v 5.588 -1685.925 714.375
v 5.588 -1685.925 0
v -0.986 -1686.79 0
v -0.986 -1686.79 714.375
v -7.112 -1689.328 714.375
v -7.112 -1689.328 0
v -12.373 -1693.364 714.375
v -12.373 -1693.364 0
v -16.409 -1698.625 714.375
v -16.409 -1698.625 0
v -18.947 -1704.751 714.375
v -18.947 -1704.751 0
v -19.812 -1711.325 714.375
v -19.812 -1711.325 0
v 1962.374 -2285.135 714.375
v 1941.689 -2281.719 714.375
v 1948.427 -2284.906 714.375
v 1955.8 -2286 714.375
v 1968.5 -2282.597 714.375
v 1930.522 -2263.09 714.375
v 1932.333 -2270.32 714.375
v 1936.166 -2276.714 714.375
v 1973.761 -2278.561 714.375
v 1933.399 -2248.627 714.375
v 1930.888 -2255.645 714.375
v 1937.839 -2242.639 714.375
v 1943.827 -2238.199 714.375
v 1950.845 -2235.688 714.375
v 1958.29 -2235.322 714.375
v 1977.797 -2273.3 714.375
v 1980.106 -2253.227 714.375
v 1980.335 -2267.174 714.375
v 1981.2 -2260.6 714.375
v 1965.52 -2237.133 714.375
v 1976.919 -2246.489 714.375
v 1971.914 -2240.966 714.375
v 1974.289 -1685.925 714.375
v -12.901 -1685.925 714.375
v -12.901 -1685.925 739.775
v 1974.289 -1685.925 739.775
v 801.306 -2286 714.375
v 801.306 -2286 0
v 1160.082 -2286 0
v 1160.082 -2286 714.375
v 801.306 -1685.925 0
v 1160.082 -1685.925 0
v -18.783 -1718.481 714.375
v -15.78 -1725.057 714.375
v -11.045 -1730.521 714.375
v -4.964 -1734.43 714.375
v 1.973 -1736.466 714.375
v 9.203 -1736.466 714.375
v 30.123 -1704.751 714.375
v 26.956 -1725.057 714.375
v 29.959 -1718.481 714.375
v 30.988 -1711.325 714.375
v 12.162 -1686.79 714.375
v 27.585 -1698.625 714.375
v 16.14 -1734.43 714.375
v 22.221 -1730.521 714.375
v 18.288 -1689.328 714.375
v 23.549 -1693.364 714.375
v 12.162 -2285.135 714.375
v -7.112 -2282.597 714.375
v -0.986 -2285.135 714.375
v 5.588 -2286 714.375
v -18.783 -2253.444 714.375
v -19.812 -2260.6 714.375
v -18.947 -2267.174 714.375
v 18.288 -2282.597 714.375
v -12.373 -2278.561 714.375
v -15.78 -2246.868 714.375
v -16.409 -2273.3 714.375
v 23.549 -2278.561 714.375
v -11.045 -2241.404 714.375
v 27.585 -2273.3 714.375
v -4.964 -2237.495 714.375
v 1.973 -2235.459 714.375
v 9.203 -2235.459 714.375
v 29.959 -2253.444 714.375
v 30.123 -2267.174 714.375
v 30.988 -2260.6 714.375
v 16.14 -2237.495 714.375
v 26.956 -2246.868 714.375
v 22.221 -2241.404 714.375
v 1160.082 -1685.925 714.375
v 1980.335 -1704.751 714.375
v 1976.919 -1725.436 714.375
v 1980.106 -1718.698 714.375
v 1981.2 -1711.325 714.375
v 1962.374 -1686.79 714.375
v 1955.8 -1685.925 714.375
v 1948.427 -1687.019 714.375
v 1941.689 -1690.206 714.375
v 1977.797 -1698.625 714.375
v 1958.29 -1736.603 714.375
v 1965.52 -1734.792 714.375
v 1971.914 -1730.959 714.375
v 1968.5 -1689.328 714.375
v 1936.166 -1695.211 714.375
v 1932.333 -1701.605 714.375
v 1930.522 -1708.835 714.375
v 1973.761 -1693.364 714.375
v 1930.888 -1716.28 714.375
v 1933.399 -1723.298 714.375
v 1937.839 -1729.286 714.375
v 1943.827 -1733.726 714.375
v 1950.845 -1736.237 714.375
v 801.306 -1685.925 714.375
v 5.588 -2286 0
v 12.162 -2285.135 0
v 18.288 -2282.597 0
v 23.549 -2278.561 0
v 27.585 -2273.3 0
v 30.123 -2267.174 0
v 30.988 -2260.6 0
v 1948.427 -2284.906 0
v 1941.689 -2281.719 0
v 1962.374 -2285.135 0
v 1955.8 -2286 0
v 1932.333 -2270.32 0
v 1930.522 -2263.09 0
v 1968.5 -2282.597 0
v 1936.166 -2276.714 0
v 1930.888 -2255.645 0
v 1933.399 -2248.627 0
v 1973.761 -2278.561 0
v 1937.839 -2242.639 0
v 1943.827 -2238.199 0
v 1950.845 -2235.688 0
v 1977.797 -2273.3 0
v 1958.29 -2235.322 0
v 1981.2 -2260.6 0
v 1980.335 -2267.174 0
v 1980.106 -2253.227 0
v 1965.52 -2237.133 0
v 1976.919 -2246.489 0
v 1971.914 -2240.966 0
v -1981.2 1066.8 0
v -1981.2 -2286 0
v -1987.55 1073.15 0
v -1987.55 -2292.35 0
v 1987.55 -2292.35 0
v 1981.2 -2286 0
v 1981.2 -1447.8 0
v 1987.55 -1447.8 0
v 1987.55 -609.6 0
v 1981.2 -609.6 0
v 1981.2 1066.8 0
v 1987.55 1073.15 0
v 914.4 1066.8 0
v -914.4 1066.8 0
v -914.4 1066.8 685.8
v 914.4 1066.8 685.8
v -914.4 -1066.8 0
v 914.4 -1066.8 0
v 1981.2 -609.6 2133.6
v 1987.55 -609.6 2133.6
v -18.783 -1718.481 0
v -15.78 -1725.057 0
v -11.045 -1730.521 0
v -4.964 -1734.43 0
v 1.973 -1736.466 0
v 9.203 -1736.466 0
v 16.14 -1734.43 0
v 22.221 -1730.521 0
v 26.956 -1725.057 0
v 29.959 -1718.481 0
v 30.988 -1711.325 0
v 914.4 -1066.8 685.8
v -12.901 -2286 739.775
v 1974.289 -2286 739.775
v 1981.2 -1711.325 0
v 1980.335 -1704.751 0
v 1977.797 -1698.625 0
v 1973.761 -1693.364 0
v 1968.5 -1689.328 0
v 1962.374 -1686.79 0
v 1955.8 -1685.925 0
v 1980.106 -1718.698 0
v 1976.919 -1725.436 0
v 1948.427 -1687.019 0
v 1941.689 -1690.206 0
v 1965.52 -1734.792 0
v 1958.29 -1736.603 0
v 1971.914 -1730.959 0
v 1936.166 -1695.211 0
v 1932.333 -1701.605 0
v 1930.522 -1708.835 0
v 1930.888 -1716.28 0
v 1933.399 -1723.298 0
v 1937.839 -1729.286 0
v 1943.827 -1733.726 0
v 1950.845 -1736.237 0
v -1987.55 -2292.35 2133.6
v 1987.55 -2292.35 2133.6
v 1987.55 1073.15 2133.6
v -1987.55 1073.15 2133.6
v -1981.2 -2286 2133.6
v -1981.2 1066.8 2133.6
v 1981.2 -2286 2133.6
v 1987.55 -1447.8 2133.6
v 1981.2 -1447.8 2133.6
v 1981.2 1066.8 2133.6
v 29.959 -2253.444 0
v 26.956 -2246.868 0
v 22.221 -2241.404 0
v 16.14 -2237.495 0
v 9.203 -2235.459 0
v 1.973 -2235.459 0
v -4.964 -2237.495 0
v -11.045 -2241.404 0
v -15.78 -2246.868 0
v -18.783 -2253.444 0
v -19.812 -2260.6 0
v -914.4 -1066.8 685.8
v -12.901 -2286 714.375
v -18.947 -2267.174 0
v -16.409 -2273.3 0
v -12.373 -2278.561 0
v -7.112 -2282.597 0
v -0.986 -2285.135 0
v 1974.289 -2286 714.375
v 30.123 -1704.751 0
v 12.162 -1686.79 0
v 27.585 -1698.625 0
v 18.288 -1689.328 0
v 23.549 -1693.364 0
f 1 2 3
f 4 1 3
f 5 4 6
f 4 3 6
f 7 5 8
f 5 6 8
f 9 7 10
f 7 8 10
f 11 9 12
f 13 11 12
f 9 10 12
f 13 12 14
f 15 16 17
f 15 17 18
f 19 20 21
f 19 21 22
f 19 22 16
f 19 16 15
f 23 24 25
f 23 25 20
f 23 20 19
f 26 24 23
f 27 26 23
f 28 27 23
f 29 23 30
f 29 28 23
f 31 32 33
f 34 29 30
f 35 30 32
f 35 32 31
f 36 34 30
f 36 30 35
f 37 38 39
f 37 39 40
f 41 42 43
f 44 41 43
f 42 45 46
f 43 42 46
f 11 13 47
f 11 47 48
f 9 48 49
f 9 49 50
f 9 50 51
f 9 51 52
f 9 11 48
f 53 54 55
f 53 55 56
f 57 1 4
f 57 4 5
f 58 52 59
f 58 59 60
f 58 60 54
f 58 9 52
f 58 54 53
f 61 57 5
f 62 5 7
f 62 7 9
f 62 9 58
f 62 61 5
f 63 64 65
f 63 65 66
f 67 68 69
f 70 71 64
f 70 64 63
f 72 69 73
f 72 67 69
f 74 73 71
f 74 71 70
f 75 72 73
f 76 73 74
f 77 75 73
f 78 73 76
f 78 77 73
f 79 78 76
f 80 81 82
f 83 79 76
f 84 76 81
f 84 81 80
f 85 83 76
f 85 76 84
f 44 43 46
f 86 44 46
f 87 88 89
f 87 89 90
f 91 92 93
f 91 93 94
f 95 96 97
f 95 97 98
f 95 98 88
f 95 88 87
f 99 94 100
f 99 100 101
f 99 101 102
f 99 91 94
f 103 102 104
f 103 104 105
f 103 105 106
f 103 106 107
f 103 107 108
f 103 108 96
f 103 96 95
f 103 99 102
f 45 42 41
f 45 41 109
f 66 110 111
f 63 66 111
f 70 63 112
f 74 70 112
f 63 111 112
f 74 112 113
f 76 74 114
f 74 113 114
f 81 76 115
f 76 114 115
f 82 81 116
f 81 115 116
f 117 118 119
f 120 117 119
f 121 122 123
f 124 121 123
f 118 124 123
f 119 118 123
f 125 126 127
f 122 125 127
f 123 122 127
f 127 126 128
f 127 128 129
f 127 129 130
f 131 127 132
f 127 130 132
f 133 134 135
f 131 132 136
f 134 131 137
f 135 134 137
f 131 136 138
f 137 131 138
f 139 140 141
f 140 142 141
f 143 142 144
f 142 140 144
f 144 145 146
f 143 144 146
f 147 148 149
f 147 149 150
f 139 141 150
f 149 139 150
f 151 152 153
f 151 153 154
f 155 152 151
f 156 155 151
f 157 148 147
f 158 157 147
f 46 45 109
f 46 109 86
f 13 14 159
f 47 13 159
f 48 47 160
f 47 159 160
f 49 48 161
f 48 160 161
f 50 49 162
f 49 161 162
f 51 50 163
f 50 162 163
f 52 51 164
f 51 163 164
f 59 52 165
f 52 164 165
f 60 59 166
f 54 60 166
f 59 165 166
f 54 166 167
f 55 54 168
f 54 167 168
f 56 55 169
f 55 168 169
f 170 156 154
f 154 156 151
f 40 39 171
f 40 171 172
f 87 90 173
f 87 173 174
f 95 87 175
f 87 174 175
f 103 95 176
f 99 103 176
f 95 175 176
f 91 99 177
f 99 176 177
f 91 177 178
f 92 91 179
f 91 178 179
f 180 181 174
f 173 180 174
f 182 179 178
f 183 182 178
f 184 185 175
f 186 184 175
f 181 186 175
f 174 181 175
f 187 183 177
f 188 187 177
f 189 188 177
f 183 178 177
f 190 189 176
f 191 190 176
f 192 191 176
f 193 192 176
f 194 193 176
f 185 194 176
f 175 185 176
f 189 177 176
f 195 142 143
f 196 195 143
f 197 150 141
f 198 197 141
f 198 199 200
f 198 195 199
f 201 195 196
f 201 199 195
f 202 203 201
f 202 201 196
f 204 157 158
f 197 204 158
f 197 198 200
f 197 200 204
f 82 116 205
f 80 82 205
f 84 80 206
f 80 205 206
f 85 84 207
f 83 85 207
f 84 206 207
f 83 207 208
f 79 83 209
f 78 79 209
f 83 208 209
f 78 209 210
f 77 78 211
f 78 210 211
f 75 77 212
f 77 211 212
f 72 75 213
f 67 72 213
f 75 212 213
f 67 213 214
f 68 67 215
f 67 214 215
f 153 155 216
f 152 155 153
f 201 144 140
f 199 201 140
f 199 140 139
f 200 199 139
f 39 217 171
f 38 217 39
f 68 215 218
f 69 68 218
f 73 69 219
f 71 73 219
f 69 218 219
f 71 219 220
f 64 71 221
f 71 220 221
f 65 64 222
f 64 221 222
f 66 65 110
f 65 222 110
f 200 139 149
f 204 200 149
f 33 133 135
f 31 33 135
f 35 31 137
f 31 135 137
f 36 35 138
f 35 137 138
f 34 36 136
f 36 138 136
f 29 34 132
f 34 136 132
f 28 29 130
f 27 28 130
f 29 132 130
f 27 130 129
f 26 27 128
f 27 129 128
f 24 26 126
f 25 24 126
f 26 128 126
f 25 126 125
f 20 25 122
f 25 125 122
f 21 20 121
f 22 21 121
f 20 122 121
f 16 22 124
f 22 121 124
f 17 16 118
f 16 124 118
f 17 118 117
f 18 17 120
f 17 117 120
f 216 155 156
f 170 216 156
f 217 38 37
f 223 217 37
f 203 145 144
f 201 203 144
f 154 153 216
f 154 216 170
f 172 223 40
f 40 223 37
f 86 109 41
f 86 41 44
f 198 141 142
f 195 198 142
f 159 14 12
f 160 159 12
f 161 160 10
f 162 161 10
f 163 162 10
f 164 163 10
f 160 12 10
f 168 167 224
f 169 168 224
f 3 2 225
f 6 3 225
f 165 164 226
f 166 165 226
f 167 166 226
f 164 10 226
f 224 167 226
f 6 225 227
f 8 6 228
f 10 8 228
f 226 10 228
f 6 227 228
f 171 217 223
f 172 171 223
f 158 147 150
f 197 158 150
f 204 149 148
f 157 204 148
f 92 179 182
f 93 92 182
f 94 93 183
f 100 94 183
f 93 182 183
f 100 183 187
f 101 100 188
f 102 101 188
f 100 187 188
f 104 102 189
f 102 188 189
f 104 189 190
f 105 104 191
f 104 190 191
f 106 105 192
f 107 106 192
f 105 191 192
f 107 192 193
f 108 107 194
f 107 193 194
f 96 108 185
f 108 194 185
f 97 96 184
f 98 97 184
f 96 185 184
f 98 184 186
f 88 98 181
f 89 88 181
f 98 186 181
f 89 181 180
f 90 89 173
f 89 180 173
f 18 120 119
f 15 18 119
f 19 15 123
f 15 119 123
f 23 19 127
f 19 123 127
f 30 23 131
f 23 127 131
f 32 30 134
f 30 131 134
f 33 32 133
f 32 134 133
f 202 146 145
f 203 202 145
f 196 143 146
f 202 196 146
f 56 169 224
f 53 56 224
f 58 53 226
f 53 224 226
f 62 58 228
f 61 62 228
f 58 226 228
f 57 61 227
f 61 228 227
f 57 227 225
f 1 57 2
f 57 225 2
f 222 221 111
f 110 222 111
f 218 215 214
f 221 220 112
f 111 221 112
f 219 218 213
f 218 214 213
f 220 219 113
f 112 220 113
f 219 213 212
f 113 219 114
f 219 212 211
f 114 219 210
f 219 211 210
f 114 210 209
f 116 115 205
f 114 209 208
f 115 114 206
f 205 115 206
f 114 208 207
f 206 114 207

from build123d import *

# Parameters (mm, degrees)
F0_W     = 1828.8
F0_H     = 2133.6
F1_DEPTH = 685.8
F2_W     = 358.775
F2_H     = 600.075
F3_DEPTH = 714.375
F4_W     = 1987.190834
F4_H     = 600.075
F5_DEPTH = 25.4
F6_DEPTH = 2133.6


with BuildPart() as f1:
    # F0 (on Top) → F1 (new body)
    with BuildSketch(Plane.XY):
        Rectangle(F0_W, F0_H)
    extrude(amount=F1_DEPTH)


with BuildPart() as f3:
    # F2 (on Top) → F3 (new body)
    with BuildSketch(Plane.XY):
        with Locations((980.694, -1985.9625)):
            Rectangle(F2_W, F2_H)
        with BuildLine():
            ThreePointArc((1955.8, -2286), (1973.760512, -2278.560512), (1981.2, -2260.6))
            ThreePointArc((1981.2, -2260.6), (1937.839488, -2242.639488), (1955.8, -2286))
        make_face()
        with BuildLine():
            ThreePointArc((1955.8, -1685.925), (1937.839488, -1729.285512), (1981.2, -1711.325))
            ThreePointArc((1981.2, -1711.325), (1973.760512, -1693.364488), (1955.8, -1685.925))
        make_face()
        with BuildLine():
            ThreePointArc((-19.812, -2260.6), (-12.372512, -2278.560512), (5.588, -2286))
            ThreePointArc((5.588, -2286), (23.548512, -2278.560512), (30.988, -2260.6))
            ThreePointArc((30.988, -2260.6), (5.588, -2235.2), (-19.812, -2260.6))
        make_face()
        with BuildLine():
            ThreePointArc((5.588, -1685.925), (-12.372512, -1693.364488), (-19.812, -1711.325))
            ThreePointArc((-19.812, -1711.325), (5.588, -1736.725), (30.988, -1711.325))
            ThreePointArc((30.988, -1711.325), (23.548512, -1693.364488), (5.588, -1685.925))
        make_face()
    extrude(amount=F3_DEPTH)


with BuildPart() as f5:
    # F4 (on face) → F5 (new body)
    with BuildSketch(Plane.XY.offset(714.375)):
        with Locations((980.694, -1985.9625)):
            Rectangle(F4_W, F4_H)
    extrude(amount=F5_DEPTH)


with BuildPart() as f6:
    # F2 (on Top) → F6 (new body)
    with BuildSketch(Plane.XY):
        Polygon((-1981.2, -2286), (-1981.2, 1066.8), (1981.2, 1066.8), (1981.2, -609.6), (1987.55, -609.6), (1987.55, 1073.15), (-1987.55, 1073.15), (-1987.55, -2292.35), (-101.6, -2292.35), (-19.812, -2292.35), (1987.55, -2292.35), (1987.55, -1447.8), (1981.2, -1447.8), (1981.2, -1685.925), (1981.2, -1711.325), (1981.2, -2260.6), (1981.2, -2286), (1955.8, -2286), (1160.0815, -2286), (801.3065, -2286), (5.588, -2286), (-19.812, -2286), (-101.6, -2286), align=None)
    extrude(amount=F6_DEPTH)


solid = Compound([f1.part, f3.part, f5.part, f6.part])
